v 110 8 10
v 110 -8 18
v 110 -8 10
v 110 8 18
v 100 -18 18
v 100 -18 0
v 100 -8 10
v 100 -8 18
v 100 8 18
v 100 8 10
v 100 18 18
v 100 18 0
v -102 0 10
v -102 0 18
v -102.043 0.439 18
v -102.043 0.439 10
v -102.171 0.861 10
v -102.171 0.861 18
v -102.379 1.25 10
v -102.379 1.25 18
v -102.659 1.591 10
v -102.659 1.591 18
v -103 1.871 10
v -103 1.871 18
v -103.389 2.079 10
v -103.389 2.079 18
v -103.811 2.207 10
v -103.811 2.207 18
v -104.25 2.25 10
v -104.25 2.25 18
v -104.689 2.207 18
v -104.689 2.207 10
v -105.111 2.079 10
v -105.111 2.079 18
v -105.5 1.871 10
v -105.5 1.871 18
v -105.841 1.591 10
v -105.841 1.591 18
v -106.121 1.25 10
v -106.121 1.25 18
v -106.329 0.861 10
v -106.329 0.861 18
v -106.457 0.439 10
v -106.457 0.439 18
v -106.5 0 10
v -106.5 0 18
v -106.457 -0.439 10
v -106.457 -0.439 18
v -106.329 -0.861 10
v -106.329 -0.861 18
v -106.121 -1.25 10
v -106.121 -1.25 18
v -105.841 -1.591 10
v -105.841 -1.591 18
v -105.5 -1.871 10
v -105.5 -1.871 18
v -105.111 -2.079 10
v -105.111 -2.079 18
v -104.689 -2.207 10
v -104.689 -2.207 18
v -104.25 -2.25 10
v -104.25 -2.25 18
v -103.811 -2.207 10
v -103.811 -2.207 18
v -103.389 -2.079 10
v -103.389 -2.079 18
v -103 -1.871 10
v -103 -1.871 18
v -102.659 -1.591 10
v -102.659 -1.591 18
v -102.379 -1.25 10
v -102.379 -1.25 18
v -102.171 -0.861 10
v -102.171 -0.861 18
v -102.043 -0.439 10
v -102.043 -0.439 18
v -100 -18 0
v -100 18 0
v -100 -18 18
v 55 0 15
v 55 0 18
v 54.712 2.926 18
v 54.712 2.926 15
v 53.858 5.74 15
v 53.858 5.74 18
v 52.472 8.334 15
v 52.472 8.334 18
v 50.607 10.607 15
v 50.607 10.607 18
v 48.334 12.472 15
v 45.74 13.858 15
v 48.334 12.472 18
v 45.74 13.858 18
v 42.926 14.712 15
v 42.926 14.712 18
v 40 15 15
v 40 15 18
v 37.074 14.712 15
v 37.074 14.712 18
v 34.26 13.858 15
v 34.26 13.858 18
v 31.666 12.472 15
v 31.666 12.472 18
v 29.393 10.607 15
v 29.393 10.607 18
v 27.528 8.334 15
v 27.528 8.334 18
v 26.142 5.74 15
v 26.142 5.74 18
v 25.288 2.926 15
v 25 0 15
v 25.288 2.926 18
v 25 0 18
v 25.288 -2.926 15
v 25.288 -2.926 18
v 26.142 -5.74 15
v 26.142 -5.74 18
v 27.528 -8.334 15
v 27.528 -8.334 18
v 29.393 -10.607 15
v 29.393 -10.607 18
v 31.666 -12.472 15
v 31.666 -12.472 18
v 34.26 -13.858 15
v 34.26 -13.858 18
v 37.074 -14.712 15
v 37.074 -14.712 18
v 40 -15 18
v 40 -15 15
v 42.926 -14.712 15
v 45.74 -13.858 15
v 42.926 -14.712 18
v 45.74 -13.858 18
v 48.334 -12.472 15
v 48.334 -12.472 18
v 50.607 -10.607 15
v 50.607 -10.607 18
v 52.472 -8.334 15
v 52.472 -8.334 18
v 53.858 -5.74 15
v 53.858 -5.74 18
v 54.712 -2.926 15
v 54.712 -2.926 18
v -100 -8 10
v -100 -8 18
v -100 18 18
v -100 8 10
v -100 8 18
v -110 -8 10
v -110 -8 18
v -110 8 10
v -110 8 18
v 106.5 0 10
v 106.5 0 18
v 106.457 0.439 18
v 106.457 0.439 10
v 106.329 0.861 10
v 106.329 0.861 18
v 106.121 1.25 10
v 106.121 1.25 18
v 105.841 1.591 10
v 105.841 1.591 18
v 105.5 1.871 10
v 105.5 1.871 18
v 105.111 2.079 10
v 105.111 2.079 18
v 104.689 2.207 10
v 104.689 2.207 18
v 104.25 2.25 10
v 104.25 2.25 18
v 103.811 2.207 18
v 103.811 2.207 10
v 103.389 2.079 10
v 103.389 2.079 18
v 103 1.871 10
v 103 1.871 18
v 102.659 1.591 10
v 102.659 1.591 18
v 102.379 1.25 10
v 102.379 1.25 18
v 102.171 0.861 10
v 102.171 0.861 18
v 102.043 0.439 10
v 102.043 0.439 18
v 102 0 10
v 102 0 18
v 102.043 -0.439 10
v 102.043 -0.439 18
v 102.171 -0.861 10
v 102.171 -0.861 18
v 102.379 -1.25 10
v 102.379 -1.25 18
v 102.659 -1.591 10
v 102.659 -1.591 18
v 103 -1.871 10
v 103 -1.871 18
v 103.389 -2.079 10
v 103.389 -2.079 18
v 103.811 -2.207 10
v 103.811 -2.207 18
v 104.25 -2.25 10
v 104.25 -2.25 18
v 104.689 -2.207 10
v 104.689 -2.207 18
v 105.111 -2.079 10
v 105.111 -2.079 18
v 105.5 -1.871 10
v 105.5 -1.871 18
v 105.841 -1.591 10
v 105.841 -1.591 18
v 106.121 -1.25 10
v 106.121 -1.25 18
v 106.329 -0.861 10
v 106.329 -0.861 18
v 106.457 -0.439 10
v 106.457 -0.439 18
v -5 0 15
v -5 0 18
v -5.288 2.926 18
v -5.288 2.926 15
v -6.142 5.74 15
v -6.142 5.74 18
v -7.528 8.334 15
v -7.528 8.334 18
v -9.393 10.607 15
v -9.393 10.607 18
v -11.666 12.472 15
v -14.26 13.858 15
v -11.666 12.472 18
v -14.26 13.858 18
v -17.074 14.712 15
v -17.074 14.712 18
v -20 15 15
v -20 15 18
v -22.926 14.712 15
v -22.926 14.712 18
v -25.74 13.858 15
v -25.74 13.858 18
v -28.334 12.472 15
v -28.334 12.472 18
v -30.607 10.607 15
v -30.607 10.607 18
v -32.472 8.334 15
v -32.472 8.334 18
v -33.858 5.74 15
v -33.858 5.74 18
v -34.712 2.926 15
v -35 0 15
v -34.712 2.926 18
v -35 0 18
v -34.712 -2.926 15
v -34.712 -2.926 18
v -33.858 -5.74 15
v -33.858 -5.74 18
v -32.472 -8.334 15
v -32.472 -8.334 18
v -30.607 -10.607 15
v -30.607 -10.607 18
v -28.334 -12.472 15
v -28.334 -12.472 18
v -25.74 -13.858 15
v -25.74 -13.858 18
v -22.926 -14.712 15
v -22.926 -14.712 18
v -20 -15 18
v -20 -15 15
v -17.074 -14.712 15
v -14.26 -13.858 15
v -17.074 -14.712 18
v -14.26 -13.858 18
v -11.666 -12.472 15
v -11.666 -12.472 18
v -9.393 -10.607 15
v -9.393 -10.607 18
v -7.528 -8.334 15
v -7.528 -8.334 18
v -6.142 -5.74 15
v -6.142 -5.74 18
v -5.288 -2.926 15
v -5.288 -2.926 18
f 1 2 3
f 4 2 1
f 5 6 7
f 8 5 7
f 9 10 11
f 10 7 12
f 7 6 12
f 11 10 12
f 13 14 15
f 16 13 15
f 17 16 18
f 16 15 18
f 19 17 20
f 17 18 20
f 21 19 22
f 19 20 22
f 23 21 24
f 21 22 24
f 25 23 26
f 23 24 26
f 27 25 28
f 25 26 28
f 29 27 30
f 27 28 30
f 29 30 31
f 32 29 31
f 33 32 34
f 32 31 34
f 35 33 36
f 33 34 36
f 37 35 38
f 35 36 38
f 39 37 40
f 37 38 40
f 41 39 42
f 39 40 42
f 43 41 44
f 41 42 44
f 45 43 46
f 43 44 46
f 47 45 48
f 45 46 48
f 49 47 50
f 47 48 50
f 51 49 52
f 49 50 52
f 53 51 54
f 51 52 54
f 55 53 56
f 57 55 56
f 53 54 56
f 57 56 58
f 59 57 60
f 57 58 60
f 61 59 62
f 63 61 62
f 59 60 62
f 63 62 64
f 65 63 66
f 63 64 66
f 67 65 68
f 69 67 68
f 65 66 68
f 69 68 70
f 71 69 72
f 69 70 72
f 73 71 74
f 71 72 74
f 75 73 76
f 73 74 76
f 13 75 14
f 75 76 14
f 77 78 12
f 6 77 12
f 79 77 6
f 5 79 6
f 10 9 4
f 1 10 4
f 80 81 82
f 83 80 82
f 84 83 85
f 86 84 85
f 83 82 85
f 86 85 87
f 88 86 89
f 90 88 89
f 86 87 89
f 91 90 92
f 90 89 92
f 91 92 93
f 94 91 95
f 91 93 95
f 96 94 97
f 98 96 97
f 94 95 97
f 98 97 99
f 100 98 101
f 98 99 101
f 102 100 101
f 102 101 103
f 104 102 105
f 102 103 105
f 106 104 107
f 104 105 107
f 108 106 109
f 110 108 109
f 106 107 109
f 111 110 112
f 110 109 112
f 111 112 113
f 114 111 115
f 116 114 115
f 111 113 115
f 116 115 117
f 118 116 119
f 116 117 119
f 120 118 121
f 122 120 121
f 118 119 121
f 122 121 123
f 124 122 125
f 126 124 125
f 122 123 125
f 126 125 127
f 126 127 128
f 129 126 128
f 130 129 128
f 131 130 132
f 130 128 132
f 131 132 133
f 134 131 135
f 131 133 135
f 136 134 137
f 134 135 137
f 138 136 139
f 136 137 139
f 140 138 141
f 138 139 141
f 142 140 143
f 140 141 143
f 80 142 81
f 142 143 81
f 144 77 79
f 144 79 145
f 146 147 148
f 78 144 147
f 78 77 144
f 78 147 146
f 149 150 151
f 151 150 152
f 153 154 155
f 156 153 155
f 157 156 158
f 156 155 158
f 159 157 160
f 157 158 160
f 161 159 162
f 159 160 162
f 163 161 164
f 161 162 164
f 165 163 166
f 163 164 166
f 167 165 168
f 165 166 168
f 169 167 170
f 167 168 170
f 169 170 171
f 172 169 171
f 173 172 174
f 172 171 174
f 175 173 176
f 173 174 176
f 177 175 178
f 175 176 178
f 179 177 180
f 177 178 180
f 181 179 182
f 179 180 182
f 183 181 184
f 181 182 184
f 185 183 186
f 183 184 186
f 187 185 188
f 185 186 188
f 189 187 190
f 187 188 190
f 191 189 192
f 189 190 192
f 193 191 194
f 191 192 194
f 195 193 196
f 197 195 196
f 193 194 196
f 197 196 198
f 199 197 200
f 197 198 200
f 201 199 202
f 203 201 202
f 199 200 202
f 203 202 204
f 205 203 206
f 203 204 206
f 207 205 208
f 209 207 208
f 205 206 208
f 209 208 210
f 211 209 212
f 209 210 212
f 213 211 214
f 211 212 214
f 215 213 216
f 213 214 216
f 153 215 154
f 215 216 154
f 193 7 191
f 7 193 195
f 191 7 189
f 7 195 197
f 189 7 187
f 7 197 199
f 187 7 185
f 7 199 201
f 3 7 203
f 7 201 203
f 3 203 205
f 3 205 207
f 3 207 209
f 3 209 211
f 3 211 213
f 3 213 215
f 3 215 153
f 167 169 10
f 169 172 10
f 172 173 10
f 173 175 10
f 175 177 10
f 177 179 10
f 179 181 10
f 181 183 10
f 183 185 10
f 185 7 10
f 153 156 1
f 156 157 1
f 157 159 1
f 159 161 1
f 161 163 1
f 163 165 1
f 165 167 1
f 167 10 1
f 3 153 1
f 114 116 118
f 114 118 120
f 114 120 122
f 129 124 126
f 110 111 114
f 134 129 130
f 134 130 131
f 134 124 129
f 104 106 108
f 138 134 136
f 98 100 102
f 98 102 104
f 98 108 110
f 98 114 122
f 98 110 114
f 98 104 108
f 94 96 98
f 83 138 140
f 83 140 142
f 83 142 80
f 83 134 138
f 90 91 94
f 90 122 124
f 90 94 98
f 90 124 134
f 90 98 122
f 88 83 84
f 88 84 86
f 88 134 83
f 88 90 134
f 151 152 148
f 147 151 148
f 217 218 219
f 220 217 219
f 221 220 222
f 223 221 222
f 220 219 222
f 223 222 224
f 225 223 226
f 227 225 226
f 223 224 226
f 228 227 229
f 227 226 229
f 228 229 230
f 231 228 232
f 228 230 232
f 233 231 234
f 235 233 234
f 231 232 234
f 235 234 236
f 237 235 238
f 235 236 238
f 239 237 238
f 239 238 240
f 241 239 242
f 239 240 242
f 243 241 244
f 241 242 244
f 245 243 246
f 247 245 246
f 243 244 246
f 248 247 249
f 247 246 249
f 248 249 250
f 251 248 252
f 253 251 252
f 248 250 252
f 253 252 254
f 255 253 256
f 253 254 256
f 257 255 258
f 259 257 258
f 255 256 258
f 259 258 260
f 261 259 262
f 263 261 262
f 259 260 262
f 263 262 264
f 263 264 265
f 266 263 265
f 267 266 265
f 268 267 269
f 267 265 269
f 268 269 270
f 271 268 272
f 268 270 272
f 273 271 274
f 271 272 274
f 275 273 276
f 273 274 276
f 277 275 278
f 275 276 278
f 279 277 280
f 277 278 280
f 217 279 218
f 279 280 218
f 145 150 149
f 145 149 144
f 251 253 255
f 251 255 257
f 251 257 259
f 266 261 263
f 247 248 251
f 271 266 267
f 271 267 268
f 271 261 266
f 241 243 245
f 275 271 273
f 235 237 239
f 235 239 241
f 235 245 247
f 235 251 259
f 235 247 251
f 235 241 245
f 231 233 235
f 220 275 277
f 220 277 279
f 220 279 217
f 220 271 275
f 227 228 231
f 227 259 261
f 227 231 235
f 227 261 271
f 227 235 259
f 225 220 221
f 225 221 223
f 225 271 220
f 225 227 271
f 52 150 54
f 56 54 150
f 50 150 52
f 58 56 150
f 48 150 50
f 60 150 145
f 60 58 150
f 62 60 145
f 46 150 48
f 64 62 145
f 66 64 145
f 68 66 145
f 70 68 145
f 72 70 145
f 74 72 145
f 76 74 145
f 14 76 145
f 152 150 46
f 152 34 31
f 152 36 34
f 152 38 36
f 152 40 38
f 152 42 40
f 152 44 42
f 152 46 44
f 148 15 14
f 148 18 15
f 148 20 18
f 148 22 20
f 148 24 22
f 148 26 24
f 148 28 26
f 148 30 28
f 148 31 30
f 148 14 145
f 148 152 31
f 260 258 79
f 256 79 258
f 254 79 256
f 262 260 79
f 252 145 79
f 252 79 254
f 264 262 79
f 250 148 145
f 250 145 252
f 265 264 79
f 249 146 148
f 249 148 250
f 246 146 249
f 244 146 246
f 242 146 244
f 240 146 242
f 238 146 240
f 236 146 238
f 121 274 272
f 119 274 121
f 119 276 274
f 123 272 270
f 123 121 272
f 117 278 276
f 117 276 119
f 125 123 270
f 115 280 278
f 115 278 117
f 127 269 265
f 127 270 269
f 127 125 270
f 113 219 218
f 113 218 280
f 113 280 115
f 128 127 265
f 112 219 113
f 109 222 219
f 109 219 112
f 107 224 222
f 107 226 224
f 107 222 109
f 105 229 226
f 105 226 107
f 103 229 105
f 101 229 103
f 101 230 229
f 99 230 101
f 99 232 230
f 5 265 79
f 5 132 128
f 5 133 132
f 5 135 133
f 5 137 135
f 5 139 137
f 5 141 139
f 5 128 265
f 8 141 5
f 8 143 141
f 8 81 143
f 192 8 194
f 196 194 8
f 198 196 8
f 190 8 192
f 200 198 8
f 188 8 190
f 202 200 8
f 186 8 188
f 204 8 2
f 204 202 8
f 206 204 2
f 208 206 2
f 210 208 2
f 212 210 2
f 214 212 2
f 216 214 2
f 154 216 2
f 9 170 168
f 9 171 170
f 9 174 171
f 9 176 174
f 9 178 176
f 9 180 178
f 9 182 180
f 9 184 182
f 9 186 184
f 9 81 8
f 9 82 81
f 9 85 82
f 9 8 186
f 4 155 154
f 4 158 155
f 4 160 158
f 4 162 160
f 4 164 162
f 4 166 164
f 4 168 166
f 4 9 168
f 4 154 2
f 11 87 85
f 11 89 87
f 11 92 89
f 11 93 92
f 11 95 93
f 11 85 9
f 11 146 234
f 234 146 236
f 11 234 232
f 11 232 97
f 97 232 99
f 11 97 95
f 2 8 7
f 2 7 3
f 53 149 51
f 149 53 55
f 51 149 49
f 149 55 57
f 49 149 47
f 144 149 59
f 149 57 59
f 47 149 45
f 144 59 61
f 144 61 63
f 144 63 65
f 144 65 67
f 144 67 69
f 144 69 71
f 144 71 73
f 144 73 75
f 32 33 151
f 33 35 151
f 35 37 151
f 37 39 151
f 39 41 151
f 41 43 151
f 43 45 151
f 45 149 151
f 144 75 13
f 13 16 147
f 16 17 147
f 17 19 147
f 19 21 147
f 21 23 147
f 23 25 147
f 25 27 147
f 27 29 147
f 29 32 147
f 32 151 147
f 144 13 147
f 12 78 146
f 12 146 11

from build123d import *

# Parameters (mm, degrees)
F0_W     = 200
F0_H     = 36
F1_DEPTH = 18
F2_R     = 15
F3_DEPTH = 3
F4_W     = 10
F4_H     = 16
F4_R     = 2.25
F5_DEPTH = 8


with BuildPart() as f1:
    # F0 (on Top) → F1 (new body)
    with BuildSketch(Plane.XY):
        Rectangle(F0_W, F0_H)
    extrude(amount=F1_DEPTH)

    # F2 (on face) → F3 (cut)
    with BuildSketch(Plane.XY.offset(18)):
        with Locations((-20, 0)):
            Circle(F2_R)
        with Locations((40, 0)):
            Circle(F2_R)
    extrude(amount=-F3_DEPTH, mode=Mode.SUBTRACT)

    # F4 (on face) → F5 (join)
    with BuildSketch(Plane.XY.offset(18)):
        with Locations((-105, 0)):
            Rectangle(F4_W, F4_H)
        with Locations((-104.25, 0)):
            Circle(F4_R, mode=Mode.SUBTRACT)
        with Locations((105, 0)):
            Rectangle(F4_W, F4_H)
        with Locations((104.25, 0)):
            Circle(F4_R, mode=Mode.SUBTRACT)
    extrude(amount=-F5_DEPTH)


solid = f1.part
